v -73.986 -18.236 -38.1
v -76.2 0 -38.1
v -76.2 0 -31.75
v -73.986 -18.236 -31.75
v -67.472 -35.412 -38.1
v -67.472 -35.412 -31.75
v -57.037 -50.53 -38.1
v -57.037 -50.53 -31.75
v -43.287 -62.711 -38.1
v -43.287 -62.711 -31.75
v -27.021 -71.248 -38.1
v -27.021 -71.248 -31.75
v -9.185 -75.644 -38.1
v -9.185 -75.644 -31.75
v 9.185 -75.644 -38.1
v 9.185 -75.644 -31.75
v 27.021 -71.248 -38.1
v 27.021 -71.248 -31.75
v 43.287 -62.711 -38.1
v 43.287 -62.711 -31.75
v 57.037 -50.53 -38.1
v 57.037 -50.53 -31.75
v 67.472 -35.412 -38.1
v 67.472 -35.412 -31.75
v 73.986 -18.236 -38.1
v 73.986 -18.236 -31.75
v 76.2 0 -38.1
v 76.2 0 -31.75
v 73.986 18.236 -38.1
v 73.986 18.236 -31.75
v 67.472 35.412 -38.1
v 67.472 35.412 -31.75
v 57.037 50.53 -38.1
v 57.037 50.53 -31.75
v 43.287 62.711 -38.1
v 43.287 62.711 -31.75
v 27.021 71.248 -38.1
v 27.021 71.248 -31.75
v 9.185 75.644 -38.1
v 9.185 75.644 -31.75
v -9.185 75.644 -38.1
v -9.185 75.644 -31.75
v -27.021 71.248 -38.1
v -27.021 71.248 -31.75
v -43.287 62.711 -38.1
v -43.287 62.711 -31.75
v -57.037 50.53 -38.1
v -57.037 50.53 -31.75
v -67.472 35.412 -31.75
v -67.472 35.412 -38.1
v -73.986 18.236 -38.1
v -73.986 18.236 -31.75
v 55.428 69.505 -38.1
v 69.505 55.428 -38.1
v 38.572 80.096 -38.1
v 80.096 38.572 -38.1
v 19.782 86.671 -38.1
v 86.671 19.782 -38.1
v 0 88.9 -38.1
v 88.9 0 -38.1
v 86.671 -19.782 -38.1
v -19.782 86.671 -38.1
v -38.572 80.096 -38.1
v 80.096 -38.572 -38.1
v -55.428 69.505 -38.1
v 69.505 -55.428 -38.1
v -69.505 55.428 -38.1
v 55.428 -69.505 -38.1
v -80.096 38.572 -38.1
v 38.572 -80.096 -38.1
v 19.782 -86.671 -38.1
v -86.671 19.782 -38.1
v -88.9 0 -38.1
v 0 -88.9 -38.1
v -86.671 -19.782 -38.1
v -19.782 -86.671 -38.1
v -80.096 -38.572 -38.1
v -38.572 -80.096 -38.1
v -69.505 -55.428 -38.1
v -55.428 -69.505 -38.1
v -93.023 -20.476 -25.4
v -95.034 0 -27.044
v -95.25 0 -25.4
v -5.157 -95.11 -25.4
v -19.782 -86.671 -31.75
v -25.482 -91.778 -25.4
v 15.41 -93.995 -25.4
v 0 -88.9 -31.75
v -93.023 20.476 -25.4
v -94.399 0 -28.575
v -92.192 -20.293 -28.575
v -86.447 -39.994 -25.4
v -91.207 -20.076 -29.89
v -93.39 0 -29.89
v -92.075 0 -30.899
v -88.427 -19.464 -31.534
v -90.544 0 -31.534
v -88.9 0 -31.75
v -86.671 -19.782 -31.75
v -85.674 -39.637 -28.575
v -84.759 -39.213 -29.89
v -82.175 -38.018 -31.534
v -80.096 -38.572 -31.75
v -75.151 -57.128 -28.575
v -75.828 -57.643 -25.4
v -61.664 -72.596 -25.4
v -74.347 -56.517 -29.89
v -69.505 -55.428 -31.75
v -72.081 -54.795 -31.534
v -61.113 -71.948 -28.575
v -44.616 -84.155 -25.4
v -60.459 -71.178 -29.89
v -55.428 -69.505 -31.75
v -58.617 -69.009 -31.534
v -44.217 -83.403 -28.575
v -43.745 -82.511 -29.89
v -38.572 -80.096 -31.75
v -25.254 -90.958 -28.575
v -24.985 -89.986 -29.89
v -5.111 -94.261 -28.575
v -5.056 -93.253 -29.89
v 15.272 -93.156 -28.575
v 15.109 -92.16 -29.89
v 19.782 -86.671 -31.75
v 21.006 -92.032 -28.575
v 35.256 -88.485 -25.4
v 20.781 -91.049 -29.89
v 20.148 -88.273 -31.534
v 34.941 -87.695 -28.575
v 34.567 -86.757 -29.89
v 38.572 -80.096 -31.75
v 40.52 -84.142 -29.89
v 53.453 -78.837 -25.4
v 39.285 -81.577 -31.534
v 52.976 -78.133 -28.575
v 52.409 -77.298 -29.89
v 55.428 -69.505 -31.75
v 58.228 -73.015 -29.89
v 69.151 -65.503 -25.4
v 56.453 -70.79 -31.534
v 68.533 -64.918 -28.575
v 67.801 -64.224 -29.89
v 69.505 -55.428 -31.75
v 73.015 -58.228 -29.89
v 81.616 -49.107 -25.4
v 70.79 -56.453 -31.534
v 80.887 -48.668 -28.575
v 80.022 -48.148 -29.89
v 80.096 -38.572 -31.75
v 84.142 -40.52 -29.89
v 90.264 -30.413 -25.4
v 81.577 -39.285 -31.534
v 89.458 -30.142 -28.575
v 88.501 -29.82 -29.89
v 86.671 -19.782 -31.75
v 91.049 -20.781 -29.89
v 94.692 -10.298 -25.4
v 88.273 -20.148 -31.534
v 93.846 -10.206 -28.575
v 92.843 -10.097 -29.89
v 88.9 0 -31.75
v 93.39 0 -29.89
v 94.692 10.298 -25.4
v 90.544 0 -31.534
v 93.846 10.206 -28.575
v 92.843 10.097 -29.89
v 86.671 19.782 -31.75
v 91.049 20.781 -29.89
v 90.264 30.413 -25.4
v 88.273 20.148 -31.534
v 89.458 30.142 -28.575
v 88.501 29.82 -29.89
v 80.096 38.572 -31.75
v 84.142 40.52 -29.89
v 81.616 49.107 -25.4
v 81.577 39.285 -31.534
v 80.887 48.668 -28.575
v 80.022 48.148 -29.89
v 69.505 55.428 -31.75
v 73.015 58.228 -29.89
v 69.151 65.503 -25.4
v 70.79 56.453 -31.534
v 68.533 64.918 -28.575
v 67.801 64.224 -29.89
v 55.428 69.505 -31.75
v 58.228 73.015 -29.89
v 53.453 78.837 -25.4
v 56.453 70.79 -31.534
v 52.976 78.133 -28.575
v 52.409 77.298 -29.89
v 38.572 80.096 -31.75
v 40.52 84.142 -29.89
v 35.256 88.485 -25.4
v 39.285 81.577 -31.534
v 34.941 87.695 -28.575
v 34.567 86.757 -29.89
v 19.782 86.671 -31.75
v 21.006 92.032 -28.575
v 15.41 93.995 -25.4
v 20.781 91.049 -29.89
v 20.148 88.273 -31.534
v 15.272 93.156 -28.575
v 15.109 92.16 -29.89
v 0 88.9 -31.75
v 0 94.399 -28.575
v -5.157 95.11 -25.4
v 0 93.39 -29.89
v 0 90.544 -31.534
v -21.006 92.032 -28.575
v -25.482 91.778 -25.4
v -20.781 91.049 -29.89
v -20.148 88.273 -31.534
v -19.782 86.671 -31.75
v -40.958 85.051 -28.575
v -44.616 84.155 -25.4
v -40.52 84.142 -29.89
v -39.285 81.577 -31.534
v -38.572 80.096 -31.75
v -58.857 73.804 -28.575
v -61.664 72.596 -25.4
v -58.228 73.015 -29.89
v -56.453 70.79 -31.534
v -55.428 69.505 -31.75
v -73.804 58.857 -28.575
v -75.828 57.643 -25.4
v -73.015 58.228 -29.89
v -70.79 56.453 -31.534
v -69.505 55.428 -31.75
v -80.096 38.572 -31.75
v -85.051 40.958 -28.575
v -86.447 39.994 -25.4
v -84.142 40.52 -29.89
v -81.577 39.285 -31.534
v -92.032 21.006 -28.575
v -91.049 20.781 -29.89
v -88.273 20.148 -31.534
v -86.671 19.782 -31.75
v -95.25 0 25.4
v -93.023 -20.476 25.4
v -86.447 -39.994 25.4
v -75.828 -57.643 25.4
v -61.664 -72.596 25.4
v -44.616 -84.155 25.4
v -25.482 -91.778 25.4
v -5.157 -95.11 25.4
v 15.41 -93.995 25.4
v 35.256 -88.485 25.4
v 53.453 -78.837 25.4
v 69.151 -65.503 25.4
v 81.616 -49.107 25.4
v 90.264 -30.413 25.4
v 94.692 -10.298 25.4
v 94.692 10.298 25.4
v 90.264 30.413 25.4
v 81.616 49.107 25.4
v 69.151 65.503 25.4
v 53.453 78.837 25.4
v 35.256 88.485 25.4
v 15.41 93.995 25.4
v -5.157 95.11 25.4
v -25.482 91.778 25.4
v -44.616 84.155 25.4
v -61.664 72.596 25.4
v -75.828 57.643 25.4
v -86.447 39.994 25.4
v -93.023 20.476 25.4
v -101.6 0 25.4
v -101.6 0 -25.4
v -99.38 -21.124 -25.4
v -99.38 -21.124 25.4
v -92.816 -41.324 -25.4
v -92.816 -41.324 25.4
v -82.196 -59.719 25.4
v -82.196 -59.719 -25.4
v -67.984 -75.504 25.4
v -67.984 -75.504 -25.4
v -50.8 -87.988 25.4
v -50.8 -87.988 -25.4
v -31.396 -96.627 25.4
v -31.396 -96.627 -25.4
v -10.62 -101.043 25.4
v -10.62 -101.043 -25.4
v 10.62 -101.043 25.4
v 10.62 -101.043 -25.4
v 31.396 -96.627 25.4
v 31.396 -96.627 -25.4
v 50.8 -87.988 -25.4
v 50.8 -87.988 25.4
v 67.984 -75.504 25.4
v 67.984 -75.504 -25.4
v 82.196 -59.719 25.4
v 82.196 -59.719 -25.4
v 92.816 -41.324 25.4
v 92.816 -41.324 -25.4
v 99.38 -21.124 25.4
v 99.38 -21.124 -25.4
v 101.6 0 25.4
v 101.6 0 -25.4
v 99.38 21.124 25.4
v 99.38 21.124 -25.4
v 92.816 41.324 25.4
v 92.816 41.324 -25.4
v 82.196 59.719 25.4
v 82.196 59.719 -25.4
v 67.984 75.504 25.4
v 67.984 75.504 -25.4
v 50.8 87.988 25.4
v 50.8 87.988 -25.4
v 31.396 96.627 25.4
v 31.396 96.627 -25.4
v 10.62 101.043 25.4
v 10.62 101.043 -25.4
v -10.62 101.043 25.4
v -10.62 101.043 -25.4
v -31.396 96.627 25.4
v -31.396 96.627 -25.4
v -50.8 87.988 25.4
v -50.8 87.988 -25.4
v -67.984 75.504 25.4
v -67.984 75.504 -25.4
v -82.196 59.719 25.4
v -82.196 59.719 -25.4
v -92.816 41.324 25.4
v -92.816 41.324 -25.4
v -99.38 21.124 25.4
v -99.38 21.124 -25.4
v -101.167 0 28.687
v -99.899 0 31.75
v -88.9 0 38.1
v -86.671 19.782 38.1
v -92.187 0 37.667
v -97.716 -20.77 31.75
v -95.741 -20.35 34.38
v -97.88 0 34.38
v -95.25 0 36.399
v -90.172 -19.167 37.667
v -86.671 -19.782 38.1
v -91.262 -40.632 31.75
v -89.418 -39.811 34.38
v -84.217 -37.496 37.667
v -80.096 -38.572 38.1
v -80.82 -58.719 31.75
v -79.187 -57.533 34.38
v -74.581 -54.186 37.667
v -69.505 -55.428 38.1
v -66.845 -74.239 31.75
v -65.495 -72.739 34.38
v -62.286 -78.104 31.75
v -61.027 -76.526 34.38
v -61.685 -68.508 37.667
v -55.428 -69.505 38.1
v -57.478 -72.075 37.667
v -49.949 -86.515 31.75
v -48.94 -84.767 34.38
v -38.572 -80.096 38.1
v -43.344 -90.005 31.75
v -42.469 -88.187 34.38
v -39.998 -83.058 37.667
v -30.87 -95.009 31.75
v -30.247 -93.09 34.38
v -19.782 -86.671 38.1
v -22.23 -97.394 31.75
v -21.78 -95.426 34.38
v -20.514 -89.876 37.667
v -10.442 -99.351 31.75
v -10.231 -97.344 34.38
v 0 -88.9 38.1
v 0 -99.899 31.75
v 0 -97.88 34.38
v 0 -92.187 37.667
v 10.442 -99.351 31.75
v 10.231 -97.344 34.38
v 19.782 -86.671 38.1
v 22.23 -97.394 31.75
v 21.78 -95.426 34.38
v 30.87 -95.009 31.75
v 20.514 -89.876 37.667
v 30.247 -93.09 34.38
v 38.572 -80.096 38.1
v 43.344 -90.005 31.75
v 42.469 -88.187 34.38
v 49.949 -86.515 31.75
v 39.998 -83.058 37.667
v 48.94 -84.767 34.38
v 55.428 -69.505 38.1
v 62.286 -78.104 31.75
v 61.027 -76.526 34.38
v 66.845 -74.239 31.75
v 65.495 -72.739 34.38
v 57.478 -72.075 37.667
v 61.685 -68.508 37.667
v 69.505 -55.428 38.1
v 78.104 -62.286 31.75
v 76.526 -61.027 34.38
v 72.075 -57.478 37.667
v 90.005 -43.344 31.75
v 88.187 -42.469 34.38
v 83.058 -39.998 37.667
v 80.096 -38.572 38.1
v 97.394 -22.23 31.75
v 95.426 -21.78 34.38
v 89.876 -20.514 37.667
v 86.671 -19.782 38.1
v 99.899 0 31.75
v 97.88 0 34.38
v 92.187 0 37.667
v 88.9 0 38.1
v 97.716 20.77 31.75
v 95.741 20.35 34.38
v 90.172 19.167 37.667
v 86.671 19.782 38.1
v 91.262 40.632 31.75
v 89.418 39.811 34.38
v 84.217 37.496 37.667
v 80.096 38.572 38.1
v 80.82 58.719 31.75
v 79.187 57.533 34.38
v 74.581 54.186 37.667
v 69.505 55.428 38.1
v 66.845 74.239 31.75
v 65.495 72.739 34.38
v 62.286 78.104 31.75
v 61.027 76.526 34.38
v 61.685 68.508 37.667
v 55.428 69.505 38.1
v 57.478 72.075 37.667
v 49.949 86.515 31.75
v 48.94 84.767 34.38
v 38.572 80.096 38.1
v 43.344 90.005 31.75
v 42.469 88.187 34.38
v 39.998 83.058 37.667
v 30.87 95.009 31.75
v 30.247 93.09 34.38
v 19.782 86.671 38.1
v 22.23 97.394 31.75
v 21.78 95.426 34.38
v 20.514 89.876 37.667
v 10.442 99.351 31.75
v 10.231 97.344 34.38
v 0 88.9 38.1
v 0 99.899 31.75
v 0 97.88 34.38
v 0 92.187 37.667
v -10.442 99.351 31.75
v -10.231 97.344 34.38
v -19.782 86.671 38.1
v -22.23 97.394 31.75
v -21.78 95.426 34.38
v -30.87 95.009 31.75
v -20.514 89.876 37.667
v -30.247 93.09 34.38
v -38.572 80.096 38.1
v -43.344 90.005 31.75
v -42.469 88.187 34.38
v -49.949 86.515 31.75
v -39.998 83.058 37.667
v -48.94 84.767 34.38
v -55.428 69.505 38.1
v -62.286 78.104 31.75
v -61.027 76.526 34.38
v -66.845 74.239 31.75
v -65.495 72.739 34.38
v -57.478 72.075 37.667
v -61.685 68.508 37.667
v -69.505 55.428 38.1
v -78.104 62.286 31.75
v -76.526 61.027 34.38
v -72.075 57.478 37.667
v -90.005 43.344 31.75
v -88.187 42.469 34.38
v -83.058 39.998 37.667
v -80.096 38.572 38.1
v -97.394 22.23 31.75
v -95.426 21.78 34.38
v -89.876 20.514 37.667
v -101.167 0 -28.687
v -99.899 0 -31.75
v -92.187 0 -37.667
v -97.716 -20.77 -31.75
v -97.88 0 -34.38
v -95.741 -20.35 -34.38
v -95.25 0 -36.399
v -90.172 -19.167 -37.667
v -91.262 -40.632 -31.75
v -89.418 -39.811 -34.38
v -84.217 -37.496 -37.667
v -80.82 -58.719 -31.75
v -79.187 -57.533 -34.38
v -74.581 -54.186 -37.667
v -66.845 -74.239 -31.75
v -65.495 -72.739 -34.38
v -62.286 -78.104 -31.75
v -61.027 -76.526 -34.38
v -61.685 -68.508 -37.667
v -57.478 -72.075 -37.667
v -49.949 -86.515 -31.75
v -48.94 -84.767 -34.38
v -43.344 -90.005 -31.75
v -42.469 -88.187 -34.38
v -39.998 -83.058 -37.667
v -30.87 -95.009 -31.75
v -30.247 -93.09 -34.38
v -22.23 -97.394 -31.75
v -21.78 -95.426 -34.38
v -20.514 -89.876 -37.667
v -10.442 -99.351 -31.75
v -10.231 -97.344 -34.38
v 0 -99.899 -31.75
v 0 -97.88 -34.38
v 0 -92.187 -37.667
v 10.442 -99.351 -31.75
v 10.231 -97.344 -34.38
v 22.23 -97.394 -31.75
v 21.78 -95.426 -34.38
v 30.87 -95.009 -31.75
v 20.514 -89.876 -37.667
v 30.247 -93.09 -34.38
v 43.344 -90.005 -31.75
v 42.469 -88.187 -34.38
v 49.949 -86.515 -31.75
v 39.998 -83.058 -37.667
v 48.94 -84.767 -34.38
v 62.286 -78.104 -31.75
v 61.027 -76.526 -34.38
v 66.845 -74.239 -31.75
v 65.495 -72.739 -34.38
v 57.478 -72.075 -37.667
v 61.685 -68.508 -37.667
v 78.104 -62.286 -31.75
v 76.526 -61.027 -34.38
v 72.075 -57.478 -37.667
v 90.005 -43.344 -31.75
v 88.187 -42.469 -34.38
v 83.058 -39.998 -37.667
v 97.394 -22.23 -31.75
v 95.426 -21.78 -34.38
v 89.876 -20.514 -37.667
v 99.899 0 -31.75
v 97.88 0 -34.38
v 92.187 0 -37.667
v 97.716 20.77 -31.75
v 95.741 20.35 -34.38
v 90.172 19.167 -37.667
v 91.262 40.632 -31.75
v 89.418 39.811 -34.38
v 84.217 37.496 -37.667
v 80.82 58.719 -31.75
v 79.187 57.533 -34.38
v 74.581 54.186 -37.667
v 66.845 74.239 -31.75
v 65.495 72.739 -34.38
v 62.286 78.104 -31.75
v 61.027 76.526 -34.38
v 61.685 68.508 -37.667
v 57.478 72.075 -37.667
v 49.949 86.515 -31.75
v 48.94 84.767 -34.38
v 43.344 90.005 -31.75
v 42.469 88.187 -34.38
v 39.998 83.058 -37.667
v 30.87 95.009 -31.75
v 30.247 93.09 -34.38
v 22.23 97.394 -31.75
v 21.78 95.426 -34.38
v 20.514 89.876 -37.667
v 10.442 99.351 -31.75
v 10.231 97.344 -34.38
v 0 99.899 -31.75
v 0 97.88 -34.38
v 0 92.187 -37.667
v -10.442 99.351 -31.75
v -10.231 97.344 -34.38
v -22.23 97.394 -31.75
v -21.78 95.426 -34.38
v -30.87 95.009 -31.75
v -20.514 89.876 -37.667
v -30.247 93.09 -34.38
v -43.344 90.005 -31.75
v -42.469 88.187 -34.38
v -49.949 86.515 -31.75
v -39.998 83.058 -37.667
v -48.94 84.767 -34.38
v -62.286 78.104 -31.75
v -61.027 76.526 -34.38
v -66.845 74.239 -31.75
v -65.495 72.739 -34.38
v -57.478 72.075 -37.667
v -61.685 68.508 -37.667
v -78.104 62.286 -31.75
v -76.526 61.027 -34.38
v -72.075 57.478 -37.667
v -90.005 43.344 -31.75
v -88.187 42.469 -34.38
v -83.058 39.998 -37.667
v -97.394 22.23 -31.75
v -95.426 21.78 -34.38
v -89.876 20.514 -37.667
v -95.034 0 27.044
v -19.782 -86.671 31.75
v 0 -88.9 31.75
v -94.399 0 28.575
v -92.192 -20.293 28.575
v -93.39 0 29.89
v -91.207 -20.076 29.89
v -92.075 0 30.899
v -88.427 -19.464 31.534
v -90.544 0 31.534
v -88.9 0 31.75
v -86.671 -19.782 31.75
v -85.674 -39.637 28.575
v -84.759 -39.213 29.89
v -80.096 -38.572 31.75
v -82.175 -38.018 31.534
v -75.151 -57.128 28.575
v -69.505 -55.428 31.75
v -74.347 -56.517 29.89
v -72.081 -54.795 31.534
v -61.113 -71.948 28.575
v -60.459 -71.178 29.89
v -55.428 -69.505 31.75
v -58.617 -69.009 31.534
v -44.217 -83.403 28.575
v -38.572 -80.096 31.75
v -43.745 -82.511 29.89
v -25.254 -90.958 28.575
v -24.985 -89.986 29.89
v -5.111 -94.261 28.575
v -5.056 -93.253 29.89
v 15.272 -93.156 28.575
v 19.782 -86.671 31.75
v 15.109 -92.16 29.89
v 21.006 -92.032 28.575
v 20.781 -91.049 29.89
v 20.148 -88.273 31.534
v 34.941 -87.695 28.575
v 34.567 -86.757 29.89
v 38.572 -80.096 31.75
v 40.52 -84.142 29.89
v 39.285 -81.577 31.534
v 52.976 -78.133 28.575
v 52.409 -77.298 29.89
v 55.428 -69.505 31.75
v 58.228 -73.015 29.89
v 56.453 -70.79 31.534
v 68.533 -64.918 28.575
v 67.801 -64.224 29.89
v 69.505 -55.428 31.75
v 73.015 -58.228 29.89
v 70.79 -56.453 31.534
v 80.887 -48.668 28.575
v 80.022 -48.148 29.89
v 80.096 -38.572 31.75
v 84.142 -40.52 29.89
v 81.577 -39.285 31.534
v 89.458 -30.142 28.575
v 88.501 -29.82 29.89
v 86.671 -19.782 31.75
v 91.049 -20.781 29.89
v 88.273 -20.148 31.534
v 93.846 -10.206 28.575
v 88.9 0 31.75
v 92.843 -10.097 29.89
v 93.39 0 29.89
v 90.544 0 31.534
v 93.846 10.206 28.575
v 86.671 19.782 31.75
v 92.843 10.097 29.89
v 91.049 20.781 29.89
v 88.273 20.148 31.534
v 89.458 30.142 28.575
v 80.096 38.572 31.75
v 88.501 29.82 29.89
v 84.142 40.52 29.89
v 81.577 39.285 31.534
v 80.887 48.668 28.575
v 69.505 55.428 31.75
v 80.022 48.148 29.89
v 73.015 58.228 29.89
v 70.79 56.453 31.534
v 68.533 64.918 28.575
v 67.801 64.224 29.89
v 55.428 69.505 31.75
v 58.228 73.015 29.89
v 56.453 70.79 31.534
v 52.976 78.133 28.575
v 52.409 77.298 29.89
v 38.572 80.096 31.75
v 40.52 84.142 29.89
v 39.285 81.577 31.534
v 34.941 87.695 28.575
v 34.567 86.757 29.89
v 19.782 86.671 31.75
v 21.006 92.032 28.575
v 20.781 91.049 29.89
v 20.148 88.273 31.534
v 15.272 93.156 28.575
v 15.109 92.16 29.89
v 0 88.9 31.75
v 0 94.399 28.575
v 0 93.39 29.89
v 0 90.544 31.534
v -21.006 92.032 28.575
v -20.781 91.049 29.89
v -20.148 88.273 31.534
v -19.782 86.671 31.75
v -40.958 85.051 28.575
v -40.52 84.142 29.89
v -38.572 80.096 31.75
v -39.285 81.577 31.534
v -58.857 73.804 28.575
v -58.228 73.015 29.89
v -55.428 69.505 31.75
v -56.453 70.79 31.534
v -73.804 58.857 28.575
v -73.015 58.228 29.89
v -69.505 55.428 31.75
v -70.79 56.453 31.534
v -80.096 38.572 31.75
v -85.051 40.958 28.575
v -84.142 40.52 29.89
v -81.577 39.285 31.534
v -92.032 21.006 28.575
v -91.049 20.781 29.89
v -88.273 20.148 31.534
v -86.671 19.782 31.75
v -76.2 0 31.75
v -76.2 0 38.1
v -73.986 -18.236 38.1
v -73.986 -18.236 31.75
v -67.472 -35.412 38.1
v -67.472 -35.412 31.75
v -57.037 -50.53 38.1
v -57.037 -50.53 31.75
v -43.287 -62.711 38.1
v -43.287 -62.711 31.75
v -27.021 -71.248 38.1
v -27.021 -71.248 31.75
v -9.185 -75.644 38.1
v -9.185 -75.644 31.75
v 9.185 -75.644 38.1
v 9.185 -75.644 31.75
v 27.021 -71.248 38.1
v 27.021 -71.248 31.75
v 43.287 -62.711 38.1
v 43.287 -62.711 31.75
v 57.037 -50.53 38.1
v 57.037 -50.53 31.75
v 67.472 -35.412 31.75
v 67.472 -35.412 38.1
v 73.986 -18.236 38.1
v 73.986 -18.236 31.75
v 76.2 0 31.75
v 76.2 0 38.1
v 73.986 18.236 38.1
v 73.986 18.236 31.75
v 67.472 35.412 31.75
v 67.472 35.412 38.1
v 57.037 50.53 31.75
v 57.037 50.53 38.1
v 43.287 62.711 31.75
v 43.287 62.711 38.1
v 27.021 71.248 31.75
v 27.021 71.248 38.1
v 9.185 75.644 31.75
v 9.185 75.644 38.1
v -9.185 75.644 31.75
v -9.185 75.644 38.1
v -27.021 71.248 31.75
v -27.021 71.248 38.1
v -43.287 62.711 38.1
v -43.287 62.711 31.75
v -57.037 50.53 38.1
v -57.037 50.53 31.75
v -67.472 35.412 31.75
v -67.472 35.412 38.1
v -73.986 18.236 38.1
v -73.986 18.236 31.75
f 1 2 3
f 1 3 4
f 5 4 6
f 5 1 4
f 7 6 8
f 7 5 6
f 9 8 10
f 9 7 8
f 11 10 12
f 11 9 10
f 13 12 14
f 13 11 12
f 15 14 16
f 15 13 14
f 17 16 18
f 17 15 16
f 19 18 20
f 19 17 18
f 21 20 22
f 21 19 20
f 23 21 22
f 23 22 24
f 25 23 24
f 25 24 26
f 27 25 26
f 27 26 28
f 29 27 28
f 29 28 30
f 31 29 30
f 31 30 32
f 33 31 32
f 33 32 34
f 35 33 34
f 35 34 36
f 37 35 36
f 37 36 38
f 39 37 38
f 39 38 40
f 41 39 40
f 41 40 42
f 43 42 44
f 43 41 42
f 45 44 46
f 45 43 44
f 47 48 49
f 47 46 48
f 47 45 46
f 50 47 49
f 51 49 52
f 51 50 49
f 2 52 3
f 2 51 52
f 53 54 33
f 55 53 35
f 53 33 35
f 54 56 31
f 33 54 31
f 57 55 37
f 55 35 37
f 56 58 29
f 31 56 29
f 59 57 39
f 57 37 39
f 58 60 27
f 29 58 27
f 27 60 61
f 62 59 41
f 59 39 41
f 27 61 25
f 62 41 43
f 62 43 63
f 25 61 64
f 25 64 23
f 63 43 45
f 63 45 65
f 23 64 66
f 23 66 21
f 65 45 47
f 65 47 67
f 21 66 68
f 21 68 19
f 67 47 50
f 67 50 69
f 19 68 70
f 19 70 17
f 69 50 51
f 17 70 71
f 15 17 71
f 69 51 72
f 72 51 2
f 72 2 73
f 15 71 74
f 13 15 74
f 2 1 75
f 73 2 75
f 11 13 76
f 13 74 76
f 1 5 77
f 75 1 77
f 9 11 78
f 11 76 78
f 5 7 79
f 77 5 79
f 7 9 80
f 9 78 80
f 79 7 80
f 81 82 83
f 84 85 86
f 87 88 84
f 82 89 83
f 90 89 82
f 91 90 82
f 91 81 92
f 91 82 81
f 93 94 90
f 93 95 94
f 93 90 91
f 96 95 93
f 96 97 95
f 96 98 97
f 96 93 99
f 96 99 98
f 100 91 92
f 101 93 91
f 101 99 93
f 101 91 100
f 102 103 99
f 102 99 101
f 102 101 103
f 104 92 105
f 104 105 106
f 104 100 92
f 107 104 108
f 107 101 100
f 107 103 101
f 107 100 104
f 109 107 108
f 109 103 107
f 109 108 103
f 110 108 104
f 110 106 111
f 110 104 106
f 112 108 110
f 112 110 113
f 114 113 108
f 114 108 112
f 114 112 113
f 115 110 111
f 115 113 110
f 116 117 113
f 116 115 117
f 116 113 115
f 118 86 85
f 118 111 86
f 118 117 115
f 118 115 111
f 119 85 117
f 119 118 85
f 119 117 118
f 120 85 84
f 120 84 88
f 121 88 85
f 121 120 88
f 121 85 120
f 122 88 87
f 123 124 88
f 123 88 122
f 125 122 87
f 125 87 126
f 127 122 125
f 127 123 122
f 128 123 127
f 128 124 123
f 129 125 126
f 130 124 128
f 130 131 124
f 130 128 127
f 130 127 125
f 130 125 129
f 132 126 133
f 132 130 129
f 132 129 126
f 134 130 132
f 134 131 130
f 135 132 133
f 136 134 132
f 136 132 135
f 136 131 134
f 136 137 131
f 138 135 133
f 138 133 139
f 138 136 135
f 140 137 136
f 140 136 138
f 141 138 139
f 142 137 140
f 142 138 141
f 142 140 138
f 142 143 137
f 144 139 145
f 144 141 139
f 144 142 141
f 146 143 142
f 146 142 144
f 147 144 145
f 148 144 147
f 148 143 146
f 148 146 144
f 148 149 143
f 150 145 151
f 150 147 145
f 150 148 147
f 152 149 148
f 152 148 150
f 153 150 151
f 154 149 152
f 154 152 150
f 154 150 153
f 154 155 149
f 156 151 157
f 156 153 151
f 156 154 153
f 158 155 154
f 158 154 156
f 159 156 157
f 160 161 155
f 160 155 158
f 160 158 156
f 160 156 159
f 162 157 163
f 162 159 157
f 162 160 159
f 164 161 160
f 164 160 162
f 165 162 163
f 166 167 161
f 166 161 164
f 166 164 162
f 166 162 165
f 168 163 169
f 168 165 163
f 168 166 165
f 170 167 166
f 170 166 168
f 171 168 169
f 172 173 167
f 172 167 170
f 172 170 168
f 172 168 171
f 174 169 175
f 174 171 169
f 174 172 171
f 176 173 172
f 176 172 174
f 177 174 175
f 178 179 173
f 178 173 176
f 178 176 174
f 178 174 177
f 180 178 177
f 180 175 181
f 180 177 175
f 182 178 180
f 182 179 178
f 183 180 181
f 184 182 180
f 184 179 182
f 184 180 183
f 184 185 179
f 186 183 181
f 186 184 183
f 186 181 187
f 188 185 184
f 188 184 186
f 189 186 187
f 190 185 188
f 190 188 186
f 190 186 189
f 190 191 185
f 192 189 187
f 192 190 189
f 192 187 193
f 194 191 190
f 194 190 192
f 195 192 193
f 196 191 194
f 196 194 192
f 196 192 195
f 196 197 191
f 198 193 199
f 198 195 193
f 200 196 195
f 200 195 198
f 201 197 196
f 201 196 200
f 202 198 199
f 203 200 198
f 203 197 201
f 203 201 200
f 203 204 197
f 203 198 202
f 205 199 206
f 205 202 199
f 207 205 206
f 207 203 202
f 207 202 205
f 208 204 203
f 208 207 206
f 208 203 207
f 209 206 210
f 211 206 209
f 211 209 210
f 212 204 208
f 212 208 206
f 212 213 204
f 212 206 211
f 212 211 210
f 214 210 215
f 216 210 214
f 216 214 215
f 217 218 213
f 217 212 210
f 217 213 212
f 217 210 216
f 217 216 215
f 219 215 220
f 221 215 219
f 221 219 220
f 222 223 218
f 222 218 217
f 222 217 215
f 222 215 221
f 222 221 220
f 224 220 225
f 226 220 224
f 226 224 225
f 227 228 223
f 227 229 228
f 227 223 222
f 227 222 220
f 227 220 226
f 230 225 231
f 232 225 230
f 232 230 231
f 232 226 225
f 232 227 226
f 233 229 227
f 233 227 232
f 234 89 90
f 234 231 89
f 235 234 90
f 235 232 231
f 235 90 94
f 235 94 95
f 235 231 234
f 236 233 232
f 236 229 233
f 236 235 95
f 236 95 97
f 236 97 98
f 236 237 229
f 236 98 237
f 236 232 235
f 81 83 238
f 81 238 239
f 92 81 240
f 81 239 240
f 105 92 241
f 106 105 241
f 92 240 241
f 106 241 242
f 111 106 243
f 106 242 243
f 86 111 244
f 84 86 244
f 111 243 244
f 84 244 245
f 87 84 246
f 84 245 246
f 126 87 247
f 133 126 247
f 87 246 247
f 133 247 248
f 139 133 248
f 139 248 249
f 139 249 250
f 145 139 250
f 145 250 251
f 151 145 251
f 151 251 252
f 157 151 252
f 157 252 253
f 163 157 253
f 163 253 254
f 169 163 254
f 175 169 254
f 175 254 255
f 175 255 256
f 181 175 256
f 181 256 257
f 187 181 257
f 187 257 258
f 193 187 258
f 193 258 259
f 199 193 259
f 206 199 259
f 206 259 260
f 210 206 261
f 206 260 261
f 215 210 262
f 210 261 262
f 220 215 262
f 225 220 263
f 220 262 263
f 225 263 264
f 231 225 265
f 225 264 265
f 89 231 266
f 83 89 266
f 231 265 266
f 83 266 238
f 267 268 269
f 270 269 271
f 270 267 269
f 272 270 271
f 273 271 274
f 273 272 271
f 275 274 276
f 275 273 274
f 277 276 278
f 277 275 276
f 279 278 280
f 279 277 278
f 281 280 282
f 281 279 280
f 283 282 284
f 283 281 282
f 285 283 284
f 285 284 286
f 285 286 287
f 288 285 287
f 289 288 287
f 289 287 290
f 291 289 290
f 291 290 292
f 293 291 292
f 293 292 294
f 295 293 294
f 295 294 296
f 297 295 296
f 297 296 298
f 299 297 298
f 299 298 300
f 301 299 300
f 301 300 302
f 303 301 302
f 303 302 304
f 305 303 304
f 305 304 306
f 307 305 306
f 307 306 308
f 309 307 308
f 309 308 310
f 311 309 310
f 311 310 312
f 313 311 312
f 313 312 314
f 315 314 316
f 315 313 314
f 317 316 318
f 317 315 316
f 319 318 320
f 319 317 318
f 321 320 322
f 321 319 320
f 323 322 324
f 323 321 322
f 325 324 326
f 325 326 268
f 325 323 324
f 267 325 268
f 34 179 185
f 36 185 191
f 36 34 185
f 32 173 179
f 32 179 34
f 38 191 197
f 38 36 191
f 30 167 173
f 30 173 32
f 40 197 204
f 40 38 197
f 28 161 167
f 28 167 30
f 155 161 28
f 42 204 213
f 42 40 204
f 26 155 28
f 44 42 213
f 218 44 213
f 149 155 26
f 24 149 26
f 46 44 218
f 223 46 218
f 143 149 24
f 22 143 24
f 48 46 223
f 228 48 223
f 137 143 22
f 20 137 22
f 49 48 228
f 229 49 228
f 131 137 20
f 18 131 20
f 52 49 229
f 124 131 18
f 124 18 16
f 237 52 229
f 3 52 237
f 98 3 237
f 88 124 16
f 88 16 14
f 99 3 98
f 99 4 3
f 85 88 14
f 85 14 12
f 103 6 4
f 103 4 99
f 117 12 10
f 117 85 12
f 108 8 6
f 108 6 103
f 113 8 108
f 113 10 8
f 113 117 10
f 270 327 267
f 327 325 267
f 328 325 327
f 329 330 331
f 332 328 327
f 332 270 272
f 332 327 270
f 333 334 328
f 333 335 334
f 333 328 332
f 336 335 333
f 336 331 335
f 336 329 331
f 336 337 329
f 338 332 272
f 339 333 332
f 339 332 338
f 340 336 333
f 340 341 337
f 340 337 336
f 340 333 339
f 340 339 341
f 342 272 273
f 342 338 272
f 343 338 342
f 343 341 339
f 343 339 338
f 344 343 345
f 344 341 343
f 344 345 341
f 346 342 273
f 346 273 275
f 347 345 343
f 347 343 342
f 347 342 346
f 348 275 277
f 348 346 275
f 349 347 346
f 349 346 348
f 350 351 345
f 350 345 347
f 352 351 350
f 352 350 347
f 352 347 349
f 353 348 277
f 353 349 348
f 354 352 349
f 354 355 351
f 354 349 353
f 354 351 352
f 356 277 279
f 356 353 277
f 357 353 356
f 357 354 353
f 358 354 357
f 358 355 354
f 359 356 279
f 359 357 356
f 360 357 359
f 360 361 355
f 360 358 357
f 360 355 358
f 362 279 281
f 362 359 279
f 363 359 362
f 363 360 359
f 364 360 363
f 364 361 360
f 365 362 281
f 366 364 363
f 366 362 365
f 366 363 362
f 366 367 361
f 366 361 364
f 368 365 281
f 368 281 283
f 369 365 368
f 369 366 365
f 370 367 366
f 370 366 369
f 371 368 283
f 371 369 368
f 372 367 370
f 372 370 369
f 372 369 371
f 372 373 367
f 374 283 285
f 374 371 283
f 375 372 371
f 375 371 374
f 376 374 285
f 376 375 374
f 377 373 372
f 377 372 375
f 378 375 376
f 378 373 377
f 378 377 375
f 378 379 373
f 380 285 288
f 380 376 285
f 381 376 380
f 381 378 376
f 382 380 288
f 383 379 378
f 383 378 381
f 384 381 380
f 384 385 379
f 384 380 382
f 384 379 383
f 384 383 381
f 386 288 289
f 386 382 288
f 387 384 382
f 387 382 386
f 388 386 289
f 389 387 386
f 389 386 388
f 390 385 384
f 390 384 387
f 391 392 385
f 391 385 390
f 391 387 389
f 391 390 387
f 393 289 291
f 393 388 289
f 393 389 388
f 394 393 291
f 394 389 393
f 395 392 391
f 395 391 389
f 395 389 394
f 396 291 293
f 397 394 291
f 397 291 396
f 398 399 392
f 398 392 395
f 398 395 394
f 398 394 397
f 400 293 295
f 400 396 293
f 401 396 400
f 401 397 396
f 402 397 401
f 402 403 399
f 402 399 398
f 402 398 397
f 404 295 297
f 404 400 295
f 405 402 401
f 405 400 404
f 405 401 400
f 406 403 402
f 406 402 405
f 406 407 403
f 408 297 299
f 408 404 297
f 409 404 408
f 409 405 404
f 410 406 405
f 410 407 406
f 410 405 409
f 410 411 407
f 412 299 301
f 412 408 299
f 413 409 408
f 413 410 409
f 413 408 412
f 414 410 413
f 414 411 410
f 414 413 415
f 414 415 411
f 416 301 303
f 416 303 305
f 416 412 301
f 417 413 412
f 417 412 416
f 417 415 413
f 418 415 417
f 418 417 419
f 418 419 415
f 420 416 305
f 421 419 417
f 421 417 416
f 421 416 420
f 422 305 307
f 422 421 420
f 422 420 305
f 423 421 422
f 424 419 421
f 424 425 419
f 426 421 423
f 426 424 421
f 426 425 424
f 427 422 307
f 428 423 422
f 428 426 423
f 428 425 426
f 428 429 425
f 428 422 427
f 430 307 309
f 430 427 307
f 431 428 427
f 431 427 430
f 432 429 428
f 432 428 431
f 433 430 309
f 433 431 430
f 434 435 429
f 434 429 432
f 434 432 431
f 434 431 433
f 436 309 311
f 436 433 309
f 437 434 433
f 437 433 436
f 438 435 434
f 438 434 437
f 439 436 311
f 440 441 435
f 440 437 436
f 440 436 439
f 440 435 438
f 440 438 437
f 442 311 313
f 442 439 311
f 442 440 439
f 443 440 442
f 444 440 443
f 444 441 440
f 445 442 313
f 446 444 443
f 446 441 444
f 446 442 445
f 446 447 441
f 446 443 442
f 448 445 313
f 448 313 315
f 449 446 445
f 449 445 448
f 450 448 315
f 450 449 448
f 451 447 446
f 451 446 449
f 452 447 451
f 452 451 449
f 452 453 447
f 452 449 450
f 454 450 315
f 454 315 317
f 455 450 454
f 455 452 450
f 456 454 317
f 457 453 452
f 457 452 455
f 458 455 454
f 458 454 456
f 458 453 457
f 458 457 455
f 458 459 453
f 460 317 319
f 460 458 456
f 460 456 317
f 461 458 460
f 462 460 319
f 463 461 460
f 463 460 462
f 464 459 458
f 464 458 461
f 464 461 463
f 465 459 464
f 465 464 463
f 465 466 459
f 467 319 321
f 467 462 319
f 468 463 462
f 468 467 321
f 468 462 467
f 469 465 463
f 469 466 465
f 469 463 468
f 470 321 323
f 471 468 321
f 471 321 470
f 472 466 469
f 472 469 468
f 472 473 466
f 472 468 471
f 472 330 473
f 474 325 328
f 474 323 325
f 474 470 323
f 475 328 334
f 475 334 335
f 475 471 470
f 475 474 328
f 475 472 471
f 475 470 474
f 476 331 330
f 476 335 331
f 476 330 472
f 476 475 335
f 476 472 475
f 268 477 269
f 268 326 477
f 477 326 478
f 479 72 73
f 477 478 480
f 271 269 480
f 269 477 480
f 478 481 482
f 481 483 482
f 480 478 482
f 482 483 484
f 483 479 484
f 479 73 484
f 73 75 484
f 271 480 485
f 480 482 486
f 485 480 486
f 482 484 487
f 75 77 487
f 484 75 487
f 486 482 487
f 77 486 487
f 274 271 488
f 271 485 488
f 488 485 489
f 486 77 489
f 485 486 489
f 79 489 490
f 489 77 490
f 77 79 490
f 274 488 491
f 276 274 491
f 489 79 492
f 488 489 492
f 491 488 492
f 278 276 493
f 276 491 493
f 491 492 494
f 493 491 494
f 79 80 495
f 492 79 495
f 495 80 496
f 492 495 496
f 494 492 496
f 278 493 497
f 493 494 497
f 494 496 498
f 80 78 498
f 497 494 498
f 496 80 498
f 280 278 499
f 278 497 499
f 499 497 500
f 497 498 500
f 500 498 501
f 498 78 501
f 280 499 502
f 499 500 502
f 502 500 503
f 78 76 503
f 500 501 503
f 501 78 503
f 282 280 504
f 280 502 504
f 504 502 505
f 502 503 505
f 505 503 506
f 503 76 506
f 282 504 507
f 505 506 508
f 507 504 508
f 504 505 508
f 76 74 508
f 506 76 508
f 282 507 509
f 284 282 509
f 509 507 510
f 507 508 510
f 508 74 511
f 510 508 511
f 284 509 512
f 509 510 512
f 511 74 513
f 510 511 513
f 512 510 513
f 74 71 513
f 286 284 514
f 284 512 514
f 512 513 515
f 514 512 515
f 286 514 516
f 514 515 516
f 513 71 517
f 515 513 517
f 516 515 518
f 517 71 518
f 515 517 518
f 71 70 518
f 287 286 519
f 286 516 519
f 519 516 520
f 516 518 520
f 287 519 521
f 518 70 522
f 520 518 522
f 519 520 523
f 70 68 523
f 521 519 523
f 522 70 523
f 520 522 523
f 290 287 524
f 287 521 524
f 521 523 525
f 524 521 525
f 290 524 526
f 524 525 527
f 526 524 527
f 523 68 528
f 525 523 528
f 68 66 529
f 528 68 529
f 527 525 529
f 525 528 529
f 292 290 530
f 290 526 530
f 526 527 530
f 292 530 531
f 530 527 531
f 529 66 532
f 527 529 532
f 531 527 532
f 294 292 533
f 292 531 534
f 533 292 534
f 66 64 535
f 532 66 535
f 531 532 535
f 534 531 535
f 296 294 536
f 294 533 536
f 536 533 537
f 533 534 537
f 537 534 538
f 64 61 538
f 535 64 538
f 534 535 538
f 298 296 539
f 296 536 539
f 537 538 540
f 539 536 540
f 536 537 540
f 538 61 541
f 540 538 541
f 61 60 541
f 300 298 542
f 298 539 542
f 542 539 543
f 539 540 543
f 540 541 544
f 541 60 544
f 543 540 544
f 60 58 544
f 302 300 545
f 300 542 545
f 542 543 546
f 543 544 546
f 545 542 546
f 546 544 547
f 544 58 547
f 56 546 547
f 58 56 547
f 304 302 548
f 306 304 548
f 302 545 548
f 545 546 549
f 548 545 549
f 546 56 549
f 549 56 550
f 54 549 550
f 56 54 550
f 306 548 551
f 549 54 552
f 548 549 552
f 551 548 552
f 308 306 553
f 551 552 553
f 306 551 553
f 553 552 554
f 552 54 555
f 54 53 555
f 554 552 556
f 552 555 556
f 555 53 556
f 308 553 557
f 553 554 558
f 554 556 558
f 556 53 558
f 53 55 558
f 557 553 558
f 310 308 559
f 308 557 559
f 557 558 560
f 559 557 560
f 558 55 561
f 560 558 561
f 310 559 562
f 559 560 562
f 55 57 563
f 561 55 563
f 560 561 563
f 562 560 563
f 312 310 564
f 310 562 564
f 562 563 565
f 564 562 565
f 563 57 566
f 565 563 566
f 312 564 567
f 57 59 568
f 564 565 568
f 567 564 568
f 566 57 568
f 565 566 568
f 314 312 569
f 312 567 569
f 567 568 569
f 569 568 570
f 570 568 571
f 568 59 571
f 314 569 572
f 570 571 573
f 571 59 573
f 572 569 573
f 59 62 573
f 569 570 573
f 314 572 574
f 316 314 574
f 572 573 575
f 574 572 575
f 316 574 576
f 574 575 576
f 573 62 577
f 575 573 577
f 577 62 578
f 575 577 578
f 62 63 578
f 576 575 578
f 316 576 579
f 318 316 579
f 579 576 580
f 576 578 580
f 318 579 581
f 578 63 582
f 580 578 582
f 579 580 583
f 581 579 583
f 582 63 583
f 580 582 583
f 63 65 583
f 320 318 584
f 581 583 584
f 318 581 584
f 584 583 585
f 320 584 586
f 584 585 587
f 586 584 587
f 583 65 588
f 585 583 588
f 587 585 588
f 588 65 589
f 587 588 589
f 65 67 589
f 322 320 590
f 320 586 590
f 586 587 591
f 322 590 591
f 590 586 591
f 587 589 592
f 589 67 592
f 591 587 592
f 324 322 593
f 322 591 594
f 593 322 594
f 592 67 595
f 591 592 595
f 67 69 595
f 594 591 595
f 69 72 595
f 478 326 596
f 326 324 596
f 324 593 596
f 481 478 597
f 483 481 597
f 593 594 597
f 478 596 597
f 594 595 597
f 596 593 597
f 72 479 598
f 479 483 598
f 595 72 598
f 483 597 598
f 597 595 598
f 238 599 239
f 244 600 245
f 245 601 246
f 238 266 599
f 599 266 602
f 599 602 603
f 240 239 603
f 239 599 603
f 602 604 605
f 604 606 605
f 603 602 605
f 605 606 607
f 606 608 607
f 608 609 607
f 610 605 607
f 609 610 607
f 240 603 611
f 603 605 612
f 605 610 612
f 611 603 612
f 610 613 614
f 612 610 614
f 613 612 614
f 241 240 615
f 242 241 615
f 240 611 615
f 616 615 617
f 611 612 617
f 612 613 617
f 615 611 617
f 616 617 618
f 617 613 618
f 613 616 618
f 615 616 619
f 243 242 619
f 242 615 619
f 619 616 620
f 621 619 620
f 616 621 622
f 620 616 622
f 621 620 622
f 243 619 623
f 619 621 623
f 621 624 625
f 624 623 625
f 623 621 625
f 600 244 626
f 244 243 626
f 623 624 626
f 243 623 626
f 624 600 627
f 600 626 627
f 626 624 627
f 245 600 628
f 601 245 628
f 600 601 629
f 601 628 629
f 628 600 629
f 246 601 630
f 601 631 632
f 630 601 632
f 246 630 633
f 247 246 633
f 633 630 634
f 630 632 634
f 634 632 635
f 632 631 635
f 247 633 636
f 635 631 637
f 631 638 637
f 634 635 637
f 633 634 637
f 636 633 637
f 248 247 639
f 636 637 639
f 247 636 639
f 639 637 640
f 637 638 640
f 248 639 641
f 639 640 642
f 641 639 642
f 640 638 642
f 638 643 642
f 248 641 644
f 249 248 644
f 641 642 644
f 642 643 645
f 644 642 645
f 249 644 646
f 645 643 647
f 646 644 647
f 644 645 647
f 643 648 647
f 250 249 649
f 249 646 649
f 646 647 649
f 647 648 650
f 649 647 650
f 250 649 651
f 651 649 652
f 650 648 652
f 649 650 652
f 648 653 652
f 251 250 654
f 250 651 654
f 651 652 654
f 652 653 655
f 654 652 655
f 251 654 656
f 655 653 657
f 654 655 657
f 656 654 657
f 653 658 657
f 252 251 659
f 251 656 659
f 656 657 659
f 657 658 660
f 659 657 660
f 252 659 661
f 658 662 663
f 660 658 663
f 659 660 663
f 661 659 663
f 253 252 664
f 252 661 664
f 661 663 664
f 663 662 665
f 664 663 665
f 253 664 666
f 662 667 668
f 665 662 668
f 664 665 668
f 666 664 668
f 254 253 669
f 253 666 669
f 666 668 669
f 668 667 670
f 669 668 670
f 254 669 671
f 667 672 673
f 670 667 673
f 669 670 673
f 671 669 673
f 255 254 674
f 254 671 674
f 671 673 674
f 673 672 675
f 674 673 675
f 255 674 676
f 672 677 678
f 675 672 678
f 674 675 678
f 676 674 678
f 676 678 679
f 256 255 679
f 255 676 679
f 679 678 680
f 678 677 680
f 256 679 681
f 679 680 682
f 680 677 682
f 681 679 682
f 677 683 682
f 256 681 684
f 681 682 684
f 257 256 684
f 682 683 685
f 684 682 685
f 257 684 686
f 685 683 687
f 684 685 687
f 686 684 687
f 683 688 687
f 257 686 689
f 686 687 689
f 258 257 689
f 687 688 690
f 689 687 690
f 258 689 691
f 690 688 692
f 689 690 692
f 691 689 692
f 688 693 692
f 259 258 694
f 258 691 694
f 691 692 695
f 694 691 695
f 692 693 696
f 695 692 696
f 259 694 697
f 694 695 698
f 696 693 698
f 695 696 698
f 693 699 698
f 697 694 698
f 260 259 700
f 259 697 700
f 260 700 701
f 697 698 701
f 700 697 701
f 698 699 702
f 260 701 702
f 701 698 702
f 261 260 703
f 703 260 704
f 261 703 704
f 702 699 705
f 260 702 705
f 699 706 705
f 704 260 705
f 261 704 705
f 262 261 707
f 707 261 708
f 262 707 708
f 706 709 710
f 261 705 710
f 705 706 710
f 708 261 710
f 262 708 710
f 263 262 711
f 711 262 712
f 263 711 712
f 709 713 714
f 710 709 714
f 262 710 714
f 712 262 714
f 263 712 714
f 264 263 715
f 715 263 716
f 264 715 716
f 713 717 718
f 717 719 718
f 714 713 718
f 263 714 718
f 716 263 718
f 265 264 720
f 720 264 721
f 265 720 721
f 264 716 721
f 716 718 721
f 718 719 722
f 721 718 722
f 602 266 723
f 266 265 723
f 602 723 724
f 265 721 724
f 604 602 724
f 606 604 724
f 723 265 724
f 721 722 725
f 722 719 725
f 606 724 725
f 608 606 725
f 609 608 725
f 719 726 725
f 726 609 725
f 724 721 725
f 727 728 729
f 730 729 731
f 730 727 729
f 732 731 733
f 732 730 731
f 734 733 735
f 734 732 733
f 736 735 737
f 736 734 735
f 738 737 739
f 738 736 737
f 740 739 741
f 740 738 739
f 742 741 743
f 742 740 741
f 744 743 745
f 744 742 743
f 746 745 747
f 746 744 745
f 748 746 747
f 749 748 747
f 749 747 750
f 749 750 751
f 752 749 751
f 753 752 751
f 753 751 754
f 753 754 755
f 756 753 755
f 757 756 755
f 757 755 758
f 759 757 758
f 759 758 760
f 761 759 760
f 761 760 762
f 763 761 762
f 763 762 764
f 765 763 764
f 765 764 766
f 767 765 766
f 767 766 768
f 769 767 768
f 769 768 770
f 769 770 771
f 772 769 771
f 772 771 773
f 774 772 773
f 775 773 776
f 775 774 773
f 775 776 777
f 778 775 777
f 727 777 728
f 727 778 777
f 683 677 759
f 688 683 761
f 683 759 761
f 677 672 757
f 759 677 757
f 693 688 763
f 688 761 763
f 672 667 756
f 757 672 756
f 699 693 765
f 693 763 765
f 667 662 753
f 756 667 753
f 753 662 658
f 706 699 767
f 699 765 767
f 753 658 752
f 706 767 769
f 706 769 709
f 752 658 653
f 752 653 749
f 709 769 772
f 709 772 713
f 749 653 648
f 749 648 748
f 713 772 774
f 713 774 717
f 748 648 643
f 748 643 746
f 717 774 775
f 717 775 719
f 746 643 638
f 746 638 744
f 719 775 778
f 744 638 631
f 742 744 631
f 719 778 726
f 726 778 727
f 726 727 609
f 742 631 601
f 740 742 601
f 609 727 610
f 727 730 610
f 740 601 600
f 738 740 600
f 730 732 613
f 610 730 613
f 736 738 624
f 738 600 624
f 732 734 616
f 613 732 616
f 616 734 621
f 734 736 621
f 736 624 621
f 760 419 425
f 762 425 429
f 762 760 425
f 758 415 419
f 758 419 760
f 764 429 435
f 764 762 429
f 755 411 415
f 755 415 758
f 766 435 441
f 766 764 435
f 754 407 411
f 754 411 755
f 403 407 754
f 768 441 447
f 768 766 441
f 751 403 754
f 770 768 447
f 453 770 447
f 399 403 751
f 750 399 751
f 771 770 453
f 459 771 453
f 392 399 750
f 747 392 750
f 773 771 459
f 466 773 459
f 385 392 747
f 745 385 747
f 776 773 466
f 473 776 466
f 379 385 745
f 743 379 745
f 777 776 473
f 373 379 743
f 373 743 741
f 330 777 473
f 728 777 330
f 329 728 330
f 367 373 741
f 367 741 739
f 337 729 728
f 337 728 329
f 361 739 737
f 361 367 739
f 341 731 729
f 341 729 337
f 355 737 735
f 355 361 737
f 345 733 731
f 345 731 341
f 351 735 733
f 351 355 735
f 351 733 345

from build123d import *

# Parameters (mm, degrees)
SKETCH2_R           = 101.6
SKETCH2_R_2         = 76.2
BOSS_EXTRUDE1_DEPTH = 38.1
FILLET2_R           = 12.7
SHELL1_T            = -6.35


with BuildPart() as part:
    # Sketch2 → Boss-Extrude1 (new, symmetric)
    with BuildSketch(Plane.XY):
        with Locations(Location((0, 0, 0), (0, 0, 180))):
            Circle(SKETCH2_R)
        with Locations(Location((0, 0, 0), (0, 0, 180))):
            Circle(SKETCH2_R_2, mode=Mode.SUBTRACT)
    extrude(amount=BOSS_EXTRUDE1_DEPTH, both=True)

    # Fillet2
    fillet2_edges = [part.edges().sort_by_distance(p)[0] for p in [
        (101.6, 0, -38.1),
        (101.6, 0, 38.1),
    ]]
    fillet(fillet2_edges, radius=FILLET2_R)

    # Shell1
    shell1_openings = [part.faces().sort_by_distance(p)[0] for p in [
        (76.2, 0, 0),
    ]]
    offset(amount=SHELL1_T, openings=shell1_openings, kind=Kind.INTERSECTION)


solid = part.part
